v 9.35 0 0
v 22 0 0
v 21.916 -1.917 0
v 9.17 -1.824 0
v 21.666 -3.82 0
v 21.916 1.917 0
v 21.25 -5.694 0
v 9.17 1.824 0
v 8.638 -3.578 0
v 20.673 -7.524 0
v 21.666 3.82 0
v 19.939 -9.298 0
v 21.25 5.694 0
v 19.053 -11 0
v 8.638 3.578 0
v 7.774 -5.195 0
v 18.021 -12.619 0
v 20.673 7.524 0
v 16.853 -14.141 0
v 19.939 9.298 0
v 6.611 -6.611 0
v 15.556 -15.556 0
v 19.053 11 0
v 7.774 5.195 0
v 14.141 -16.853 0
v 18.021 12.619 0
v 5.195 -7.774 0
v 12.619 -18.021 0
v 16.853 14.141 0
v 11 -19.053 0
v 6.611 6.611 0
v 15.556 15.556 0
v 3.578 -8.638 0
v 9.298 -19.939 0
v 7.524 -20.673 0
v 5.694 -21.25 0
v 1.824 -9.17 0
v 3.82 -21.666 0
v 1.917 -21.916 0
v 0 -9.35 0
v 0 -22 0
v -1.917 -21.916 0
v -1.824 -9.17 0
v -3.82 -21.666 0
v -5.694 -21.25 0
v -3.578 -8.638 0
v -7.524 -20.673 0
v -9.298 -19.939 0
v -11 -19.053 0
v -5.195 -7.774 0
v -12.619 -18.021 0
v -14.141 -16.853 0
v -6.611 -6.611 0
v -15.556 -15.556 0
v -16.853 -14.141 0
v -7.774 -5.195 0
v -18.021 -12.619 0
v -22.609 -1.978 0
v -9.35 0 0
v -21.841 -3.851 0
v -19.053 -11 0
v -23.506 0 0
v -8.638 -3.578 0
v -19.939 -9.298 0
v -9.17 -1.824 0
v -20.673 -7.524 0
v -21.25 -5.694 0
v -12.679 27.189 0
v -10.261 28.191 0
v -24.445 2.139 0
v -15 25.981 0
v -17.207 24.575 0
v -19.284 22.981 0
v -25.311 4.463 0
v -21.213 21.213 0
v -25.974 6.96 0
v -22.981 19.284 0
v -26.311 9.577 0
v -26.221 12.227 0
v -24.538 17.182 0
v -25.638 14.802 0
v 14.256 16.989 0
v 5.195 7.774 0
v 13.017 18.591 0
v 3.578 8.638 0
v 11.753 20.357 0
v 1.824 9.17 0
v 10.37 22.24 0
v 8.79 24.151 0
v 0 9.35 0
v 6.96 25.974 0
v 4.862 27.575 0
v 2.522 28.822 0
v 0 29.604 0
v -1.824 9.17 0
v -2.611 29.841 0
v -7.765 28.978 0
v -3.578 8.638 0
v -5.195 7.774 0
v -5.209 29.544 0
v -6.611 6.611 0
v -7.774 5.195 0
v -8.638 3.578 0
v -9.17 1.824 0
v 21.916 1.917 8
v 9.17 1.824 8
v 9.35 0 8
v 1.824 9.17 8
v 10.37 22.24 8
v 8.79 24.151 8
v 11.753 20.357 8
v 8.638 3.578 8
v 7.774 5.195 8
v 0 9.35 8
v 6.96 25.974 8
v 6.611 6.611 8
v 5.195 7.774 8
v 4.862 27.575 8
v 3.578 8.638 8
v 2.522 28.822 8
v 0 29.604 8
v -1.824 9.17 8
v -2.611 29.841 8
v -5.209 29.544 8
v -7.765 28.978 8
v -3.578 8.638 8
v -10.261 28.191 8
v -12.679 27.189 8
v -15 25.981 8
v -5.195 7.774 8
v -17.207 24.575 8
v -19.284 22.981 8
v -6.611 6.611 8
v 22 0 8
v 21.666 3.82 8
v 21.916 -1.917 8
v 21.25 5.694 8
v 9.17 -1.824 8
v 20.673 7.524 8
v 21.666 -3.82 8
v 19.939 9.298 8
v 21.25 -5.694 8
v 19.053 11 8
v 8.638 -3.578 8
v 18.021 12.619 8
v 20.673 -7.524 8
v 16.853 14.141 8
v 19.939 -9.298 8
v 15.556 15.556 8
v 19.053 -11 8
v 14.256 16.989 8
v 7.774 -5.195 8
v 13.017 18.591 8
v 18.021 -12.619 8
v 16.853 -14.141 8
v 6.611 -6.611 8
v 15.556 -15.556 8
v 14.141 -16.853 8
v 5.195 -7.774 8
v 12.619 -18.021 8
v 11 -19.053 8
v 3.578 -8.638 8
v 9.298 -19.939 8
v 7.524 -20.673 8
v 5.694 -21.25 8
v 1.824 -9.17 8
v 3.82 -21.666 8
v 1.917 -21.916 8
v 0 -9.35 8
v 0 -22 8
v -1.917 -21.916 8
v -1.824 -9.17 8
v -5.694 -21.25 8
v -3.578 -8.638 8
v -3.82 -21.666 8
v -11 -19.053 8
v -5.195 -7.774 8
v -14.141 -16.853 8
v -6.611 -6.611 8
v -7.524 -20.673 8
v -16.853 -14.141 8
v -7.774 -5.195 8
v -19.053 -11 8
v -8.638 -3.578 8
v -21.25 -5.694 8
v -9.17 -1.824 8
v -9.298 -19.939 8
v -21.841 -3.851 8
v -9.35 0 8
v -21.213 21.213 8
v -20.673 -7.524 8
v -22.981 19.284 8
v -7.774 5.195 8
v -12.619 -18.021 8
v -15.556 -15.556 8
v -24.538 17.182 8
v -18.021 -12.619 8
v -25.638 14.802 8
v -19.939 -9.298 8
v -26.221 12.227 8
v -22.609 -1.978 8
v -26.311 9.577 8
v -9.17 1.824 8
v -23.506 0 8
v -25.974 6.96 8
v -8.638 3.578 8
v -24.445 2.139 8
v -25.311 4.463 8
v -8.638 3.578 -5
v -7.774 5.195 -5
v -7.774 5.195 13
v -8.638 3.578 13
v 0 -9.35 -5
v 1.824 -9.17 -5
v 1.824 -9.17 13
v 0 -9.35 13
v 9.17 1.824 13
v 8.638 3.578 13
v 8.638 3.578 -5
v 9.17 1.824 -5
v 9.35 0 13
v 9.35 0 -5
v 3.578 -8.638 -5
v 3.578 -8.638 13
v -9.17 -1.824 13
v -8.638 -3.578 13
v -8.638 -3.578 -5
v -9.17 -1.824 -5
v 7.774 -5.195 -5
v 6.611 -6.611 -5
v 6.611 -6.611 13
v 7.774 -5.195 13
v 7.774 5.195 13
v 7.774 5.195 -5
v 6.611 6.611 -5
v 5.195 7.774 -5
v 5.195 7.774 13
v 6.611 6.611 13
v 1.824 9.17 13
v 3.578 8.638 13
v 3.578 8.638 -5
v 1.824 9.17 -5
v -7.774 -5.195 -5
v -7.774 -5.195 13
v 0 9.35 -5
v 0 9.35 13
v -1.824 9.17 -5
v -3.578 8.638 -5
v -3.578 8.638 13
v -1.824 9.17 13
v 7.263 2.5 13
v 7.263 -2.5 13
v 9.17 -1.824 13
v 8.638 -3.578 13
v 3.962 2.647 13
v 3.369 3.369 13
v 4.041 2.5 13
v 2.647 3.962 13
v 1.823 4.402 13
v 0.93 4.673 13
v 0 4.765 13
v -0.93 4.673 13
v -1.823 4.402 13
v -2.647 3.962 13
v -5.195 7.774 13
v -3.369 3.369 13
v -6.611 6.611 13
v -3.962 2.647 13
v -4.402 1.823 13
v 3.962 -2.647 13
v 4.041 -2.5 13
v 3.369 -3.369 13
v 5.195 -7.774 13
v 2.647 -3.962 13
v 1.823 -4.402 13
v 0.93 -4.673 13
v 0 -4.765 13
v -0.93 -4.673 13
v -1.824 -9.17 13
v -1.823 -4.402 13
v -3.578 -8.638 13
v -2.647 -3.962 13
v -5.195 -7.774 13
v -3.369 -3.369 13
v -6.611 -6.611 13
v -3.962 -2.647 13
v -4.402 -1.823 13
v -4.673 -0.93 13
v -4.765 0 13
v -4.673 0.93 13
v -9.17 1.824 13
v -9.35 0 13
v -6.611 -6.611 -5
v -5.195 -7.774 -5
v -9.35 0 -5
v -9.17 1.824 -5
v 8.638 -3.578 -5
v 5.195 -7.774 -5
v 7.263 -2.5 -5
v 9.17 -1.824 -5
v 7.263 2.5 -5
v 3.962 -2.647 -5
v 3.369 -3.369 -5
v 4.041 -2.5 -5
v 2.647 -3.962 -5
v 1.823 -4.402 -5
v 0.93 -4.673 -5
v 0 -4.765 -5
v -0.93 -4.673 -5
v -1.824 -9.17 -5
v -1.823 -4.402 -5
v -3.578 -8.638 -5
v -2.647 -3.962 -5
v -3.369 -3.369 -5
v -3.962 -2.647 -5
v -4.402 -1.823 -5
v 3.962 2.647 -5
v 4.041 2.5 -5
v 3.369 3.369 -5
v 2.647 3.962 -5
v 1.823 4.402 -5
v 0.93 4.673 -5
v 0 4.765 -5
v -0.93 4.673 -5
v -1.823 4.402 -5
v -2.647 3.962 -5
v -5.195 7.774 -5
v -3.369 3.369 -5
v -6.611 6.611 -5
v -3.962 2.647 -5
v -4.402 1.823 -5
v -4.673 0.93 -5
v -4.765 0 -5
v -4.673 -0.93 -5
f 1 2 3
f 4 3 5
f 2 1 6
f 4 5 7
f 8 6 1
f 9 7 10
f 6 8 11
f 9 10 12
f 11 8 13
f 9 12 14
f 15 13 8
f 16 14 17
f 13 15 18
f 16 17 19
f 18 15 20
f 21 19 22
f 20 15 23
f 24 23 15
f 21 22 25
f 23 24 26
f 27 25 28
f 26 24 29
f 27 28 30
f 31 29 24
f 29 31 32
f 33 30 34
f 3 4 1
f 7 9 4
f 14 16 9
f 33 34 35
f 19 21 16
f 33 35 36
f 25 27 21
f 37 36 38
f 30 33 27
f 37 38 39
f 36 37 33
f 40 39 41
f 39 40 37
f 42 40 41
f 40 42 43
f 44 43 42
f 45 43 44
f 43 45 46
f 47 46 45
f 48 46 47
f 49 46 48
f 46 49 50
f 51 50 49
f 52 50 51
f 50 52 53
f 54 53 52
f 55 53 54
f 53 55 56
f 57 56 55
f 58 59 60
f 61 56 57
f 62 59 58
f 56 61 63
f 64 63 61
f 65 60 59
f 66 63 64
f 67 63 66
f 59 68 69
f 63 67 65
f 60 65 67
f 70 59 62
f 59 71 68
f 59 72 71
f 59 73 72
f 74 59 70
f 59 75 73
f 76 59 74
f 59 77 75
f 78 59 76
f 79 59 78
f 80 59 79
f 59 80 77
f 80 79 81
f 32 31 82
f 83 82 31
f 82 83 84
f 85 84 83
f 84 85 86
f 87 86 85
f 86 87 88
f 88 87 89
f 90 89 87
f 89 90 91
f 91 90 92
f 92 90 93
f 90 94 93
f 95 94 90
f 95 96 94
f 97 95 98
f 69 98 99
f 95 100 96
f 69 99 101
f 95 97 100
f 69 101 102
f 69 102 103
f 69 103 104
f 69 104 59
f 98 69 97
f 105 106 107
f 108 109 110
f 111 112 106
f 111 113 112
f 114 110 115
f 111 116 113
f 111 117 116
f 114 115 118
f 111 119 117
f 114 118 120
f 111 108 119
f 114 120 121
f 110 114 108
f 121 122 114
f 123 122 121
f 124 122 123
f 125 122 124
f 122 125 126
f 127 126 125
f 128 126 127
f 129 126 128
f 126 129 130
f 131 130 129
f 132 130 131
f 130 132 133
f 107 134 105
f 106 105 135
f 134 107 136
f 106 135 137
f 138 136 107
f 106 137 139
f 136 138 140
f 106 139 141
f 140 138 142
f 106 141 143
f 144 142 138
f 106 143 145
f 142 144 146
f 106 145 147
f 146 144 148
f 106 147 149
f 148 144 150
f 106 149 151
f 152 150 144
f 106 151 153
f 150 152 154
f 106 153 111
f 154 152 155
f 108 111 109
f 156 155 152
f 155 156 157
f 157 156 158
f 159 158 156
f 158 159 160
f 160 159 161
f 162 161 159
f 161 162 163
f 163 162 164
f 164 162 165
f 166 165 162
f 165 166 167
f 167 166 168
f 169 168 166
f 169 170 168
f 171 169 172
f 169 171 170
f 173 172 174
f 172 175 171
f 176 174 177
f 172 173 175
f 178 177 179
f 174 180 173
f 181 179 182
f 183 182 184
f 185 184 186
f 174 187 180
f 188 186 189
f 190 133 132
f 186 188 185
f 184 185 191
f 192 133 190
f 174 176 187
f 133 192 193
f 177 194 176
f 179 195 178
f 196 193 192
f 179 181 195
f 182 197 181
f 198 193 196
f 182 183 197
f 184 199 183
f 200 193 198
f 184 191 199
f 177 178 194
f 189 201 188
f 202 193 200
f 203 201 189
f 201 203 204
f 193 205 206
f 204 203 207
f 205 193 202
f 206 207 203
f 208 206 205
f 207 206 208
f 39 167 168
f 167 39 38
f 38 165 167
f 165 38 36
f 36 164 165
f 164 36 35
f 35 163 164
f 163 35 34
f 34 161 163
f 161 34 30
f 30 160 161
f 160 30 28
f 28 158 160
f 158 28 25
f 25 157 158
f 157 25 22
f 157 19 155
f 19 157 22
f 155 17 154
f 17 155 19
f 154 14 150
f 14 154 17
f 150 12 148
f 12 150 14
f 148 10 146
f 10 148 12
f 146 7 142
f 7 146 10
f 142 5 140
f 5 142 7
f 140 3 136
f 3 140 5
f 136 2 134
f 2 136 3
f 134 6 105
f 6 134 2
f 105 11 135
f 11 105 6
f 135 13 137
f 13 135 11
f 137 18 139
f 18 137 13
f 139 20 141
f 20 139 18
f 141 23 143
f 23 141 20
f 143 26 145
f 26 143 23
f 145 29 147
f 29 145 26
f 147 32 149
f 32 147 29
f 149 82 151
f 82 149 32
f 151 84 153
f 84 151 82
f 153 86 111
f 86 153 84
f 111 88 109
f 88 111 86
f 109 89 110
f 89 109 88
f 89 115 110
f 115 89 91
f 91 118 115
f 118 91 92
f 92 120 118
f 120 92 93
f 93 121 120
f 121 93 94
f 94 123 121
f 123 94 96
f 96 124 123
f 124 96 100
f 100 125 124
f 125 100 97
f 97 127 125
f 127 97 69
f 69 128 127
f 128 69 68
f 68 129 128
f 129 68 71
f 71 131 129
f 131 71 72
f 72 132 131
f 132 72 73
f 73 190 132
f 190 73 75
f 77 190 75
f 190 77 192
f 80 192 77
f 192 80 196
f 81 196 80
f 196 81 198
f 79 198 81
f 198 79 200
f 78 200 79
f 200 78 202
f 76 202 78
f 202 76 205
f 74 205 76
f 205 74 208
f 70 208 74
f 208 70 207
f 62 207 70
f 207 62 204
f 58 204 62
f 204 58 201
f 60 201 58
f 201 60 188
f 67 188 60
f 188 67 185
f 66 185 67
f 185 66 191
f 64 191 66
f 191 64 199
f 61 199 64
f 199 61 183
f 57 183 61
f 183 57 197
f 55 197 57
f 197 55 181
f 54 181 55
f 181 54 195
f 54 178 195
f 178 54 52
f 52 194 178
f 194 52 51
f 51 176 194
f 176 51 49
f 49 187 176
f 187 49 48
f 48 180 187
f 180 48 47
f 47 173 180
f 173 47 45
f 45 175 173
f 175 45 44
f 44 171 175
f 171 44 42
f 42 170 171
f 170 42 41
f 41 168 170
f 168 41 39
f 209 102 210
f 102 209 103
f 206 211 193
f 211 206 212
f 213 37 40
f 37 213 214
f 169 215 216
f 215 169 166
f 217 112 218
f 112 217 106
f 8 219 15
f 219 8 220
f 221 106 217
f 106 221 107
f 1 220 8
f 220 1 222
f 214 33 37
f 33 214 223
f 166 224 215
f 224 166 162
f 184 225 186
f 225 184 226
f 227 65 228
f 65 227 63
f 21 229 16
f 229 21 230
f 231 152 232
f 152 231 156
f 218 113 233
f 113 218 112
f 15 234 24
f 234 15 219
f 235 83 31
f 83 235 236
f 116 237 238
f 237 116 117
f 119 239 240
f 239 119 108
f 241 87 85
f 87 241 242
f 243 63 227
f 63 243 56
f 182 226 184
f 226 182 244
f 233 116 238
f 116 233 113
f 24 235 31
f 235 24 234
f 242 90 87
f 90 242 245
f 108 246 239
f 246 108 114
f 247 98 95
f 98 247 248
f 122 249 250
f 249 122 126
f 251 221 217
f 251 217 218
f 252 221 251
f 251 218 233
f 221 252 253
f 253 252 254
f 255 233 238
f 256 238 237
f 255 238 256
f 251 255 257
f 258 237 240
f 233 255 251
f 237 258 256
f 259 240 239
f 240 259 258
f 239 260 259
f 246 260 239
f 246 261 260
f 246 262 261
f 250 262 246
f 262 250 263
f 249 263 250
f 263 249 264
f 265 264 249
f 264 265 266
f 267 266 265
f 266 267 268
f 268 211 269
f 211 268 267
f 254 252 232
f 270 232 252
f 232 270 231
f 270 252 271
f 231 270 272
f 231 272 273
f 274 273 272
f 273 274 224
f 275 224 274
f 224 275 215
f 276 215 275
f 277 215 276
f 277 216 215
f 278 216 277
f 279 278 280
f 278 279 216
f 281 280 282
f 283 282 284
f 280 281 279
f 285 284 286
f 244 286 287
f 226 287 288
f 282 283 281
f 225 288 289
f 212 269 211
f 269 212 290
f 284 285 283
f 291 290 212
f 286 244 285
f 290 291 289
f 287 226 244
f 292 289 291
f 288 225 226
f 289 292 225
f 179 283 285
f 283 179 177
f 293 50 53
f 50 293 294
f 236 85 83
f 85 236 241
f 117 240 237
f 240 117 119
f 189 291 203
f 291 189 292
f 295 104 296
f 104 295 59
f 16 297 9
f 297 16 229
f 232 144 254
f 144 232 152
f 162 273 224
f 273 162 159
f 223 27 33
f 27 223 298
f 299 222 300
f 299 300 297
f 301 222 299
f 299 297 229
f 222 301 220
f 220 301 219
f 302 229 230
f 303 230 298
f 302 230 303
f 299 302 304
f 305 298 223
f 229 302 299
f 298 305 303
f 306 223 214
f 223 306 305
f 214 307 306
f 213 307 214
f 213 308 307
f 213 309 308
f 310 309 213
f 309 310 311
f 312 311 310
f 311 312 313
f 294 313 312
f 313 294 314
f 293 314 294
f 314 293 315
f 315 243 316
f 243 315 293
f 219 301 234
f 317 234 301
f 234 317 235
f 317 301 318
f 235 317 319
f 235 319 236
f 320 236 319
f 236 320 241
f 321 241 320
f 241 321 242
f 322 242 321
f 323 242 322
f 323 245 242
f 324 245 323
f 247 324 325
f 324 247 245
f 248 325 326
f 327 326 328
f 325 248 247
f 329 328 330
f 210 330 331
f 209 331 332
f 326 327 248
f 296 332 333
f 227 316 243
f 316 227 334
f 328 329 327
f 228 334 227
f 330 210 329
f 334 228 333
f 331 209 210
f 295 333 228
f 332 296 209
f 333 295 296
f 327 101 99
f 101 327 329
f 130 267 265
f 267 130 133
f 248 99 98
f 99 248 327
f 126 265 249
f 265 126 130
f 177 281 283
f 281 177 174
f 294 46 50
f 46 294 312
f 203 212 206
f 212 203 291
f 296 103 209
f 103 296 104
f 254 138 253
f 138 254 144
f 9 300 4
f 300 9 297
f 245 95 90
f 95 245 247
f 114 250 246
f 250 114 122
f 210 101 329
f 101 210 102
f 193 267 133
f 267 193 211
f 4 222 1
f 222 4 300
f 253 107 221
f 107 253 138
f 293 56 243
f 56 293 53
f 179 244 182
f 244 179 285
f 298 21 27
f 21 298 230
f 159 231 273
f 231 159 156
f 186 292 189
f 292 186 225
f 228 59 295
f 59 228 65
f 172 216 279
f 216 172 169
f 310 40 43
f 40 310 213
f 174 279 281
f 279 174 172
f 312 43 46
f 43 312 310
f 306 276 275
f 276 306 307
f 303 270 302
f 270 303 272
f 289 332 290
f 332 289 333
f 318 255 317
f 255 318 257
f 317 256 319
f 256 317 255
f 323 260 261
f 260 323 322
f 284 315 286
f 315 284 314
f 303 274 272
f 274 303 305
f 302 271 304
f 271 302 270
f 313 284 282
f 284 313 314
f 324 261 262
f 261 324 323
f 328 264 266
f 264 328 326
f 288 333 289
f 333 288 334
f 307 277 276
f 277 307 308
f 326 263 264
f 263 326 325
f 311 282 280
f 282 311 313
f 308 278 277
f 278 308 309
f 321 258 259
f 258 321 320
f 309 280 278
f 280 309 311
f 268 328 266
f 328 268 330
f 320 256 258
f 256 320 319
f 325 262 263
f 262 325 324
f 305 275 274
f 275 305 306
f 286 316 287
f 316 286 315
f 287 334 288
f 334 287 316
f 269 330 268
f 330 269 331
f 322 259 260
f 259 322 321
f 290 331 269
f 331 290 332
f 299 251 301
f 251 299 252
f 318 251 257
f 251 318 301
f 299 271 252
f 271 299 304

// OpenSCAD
$fn = 32;

// ----------------------------------------------------------------------
// Cam: base radius 22 mm with a 8 mm lift over 150 degrees
// ----------------------------------------------------------------------

// --- parameters (mm) ---
base_r = 22;              // base radius
lift = 8;                 // lift height above the base radius
lift_span = 150;          // angular width of the lift
lift_start = 45;          // angle where the lift starts
cam_t = 8;                // cam plate thickness
hub_d = 18.7;             // hub diameter
hub_h = 18;               // hub height
bore_d = 9.53;            // bore
key_w = 5;                // keyway width
key_depth = 2.5;          // keyway depth

cam_profile = [[22, 0], [21.916, 1.917], [21.666, 3.82], [21.25, 5.694], [20.673, 7.524], [19.939, 9.298], [19.053, 11], [18.021, 12.619], [16.853, 14.141], [15.556, 15.556], [14.256, 16.989], [13.017, 18.591], [11.753, 20.357], [10.37, 22.24], [8.79, 24.151], [6.96, 25.974], [4.862, 27.575], [2.522, 28.822], [0, 29.604], [-2.611, 29.841], [-5.209, 29.544], [-7.765, 28.978], [-10.261, 28.191], [-12.679, 27.189], [-15, 25.981], [-17.207, 24.575], [-19.284, 22.981], [-21.213, 21.213], [-22.981, 19.284], [-24.538, 17.182], [-25.638, 14.802], [-26.221, 12.227], [-26.311, 9.577], [-25.974, 6.96], [-25.311, 4.463], [-24.445, 2.139], [-23.506, 0], [-22.609, -1.978], [-21.841, -3.851], [-21.25, -5.694], [-20.673, -7.524], [-19.939, -9.298], [-19.053, -11], [-18.021, -12.619], [-16.853, -14.141], [-15.556, -15.556], [-14.141, -16.853], [-12.619, -18.021], [-11, -19.053], [-9.298, -19.939], [-7.524, -20.673], [-5.694, -21.25], [-3.82, -21.666], [-1.917, -21.916], [0, -22], [1.917, -21.916], [3.82, -21.666], [5.694, -21.25], [7.524, -20.673], [9.298, -19.939], [11, -19.053], [12.619, -18.021], [14.141, -16.853], [15.556, -15.556], [16.853, -14.141], [18.021, -12.619], [19.053, -11], [19.939, -9.298], [20.673, -7.524], [21.25, -5.694], [21.666, -3.82], [21.916, -1.917]];

difference() {
  union() {
    linear_extrude(height = cam_t) polygon(cam_profile);
    /* hub, proud of the cam plate on both sides */
    translate([0, 0, -5]) cylinder(h = hub_h, d = hub_d);
  }
  /* bore through the hub, 2.5 mm clear on both faces */
  translate([0, 0, -7.5]) cylinder(h = hub_h + 5, d = bore_d);
  /* keyway, milled through the whole hub */
  translate([2.263, -2.5, -7.5]) cube([5, 5, 23]);
}
